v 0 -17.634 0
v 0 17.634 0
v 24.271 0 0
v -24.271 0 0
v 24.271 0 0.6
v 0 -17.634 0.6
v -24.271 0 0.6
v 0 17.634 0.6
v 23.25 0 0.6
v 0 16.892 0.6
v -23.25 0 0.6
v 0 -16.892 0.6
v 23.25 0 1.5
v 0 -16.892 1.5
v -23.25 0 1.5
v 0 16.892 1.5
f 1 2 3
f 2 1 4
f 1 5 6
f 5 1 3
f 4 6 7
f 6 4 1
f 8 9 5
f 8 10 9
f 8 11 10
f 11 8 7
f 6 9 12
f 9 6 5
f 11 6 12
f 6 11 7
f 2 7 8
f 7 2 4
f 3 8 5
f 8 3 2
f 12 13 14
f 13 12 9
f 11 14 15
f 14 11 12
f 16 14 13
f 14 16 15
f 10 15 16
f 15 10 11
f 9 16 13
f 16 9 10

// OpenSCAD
module penrose3(angle, side, height = 1.5, perimeter_width = 0.6, perimeter_depth = 0.9) {
  x = side * cos(0.5 * angle);
  y = side * sin(0.5 * angle);
  linear_extrude(height = height - perimeter_depth) {
    polygon([
      [-x, 0],
      [0, y],
      [x, 0],
      [0, -y]]);
  }
  xp = x - perimeter_width / sin(0.5 * angle);
  yp = y - perimeter_width / cos(0.5 * angle);
  linear_extrude(height = height) {
    polygon([
      [-xp, 0],
      [0, yp],
      [xp, 0],
      [0, -yp]]);
  }
  echo(angle=angle, side=side, x=x, y=y);
}

penrose3(72, 30); // Fat
// penrose3(36, 30); // Thin
